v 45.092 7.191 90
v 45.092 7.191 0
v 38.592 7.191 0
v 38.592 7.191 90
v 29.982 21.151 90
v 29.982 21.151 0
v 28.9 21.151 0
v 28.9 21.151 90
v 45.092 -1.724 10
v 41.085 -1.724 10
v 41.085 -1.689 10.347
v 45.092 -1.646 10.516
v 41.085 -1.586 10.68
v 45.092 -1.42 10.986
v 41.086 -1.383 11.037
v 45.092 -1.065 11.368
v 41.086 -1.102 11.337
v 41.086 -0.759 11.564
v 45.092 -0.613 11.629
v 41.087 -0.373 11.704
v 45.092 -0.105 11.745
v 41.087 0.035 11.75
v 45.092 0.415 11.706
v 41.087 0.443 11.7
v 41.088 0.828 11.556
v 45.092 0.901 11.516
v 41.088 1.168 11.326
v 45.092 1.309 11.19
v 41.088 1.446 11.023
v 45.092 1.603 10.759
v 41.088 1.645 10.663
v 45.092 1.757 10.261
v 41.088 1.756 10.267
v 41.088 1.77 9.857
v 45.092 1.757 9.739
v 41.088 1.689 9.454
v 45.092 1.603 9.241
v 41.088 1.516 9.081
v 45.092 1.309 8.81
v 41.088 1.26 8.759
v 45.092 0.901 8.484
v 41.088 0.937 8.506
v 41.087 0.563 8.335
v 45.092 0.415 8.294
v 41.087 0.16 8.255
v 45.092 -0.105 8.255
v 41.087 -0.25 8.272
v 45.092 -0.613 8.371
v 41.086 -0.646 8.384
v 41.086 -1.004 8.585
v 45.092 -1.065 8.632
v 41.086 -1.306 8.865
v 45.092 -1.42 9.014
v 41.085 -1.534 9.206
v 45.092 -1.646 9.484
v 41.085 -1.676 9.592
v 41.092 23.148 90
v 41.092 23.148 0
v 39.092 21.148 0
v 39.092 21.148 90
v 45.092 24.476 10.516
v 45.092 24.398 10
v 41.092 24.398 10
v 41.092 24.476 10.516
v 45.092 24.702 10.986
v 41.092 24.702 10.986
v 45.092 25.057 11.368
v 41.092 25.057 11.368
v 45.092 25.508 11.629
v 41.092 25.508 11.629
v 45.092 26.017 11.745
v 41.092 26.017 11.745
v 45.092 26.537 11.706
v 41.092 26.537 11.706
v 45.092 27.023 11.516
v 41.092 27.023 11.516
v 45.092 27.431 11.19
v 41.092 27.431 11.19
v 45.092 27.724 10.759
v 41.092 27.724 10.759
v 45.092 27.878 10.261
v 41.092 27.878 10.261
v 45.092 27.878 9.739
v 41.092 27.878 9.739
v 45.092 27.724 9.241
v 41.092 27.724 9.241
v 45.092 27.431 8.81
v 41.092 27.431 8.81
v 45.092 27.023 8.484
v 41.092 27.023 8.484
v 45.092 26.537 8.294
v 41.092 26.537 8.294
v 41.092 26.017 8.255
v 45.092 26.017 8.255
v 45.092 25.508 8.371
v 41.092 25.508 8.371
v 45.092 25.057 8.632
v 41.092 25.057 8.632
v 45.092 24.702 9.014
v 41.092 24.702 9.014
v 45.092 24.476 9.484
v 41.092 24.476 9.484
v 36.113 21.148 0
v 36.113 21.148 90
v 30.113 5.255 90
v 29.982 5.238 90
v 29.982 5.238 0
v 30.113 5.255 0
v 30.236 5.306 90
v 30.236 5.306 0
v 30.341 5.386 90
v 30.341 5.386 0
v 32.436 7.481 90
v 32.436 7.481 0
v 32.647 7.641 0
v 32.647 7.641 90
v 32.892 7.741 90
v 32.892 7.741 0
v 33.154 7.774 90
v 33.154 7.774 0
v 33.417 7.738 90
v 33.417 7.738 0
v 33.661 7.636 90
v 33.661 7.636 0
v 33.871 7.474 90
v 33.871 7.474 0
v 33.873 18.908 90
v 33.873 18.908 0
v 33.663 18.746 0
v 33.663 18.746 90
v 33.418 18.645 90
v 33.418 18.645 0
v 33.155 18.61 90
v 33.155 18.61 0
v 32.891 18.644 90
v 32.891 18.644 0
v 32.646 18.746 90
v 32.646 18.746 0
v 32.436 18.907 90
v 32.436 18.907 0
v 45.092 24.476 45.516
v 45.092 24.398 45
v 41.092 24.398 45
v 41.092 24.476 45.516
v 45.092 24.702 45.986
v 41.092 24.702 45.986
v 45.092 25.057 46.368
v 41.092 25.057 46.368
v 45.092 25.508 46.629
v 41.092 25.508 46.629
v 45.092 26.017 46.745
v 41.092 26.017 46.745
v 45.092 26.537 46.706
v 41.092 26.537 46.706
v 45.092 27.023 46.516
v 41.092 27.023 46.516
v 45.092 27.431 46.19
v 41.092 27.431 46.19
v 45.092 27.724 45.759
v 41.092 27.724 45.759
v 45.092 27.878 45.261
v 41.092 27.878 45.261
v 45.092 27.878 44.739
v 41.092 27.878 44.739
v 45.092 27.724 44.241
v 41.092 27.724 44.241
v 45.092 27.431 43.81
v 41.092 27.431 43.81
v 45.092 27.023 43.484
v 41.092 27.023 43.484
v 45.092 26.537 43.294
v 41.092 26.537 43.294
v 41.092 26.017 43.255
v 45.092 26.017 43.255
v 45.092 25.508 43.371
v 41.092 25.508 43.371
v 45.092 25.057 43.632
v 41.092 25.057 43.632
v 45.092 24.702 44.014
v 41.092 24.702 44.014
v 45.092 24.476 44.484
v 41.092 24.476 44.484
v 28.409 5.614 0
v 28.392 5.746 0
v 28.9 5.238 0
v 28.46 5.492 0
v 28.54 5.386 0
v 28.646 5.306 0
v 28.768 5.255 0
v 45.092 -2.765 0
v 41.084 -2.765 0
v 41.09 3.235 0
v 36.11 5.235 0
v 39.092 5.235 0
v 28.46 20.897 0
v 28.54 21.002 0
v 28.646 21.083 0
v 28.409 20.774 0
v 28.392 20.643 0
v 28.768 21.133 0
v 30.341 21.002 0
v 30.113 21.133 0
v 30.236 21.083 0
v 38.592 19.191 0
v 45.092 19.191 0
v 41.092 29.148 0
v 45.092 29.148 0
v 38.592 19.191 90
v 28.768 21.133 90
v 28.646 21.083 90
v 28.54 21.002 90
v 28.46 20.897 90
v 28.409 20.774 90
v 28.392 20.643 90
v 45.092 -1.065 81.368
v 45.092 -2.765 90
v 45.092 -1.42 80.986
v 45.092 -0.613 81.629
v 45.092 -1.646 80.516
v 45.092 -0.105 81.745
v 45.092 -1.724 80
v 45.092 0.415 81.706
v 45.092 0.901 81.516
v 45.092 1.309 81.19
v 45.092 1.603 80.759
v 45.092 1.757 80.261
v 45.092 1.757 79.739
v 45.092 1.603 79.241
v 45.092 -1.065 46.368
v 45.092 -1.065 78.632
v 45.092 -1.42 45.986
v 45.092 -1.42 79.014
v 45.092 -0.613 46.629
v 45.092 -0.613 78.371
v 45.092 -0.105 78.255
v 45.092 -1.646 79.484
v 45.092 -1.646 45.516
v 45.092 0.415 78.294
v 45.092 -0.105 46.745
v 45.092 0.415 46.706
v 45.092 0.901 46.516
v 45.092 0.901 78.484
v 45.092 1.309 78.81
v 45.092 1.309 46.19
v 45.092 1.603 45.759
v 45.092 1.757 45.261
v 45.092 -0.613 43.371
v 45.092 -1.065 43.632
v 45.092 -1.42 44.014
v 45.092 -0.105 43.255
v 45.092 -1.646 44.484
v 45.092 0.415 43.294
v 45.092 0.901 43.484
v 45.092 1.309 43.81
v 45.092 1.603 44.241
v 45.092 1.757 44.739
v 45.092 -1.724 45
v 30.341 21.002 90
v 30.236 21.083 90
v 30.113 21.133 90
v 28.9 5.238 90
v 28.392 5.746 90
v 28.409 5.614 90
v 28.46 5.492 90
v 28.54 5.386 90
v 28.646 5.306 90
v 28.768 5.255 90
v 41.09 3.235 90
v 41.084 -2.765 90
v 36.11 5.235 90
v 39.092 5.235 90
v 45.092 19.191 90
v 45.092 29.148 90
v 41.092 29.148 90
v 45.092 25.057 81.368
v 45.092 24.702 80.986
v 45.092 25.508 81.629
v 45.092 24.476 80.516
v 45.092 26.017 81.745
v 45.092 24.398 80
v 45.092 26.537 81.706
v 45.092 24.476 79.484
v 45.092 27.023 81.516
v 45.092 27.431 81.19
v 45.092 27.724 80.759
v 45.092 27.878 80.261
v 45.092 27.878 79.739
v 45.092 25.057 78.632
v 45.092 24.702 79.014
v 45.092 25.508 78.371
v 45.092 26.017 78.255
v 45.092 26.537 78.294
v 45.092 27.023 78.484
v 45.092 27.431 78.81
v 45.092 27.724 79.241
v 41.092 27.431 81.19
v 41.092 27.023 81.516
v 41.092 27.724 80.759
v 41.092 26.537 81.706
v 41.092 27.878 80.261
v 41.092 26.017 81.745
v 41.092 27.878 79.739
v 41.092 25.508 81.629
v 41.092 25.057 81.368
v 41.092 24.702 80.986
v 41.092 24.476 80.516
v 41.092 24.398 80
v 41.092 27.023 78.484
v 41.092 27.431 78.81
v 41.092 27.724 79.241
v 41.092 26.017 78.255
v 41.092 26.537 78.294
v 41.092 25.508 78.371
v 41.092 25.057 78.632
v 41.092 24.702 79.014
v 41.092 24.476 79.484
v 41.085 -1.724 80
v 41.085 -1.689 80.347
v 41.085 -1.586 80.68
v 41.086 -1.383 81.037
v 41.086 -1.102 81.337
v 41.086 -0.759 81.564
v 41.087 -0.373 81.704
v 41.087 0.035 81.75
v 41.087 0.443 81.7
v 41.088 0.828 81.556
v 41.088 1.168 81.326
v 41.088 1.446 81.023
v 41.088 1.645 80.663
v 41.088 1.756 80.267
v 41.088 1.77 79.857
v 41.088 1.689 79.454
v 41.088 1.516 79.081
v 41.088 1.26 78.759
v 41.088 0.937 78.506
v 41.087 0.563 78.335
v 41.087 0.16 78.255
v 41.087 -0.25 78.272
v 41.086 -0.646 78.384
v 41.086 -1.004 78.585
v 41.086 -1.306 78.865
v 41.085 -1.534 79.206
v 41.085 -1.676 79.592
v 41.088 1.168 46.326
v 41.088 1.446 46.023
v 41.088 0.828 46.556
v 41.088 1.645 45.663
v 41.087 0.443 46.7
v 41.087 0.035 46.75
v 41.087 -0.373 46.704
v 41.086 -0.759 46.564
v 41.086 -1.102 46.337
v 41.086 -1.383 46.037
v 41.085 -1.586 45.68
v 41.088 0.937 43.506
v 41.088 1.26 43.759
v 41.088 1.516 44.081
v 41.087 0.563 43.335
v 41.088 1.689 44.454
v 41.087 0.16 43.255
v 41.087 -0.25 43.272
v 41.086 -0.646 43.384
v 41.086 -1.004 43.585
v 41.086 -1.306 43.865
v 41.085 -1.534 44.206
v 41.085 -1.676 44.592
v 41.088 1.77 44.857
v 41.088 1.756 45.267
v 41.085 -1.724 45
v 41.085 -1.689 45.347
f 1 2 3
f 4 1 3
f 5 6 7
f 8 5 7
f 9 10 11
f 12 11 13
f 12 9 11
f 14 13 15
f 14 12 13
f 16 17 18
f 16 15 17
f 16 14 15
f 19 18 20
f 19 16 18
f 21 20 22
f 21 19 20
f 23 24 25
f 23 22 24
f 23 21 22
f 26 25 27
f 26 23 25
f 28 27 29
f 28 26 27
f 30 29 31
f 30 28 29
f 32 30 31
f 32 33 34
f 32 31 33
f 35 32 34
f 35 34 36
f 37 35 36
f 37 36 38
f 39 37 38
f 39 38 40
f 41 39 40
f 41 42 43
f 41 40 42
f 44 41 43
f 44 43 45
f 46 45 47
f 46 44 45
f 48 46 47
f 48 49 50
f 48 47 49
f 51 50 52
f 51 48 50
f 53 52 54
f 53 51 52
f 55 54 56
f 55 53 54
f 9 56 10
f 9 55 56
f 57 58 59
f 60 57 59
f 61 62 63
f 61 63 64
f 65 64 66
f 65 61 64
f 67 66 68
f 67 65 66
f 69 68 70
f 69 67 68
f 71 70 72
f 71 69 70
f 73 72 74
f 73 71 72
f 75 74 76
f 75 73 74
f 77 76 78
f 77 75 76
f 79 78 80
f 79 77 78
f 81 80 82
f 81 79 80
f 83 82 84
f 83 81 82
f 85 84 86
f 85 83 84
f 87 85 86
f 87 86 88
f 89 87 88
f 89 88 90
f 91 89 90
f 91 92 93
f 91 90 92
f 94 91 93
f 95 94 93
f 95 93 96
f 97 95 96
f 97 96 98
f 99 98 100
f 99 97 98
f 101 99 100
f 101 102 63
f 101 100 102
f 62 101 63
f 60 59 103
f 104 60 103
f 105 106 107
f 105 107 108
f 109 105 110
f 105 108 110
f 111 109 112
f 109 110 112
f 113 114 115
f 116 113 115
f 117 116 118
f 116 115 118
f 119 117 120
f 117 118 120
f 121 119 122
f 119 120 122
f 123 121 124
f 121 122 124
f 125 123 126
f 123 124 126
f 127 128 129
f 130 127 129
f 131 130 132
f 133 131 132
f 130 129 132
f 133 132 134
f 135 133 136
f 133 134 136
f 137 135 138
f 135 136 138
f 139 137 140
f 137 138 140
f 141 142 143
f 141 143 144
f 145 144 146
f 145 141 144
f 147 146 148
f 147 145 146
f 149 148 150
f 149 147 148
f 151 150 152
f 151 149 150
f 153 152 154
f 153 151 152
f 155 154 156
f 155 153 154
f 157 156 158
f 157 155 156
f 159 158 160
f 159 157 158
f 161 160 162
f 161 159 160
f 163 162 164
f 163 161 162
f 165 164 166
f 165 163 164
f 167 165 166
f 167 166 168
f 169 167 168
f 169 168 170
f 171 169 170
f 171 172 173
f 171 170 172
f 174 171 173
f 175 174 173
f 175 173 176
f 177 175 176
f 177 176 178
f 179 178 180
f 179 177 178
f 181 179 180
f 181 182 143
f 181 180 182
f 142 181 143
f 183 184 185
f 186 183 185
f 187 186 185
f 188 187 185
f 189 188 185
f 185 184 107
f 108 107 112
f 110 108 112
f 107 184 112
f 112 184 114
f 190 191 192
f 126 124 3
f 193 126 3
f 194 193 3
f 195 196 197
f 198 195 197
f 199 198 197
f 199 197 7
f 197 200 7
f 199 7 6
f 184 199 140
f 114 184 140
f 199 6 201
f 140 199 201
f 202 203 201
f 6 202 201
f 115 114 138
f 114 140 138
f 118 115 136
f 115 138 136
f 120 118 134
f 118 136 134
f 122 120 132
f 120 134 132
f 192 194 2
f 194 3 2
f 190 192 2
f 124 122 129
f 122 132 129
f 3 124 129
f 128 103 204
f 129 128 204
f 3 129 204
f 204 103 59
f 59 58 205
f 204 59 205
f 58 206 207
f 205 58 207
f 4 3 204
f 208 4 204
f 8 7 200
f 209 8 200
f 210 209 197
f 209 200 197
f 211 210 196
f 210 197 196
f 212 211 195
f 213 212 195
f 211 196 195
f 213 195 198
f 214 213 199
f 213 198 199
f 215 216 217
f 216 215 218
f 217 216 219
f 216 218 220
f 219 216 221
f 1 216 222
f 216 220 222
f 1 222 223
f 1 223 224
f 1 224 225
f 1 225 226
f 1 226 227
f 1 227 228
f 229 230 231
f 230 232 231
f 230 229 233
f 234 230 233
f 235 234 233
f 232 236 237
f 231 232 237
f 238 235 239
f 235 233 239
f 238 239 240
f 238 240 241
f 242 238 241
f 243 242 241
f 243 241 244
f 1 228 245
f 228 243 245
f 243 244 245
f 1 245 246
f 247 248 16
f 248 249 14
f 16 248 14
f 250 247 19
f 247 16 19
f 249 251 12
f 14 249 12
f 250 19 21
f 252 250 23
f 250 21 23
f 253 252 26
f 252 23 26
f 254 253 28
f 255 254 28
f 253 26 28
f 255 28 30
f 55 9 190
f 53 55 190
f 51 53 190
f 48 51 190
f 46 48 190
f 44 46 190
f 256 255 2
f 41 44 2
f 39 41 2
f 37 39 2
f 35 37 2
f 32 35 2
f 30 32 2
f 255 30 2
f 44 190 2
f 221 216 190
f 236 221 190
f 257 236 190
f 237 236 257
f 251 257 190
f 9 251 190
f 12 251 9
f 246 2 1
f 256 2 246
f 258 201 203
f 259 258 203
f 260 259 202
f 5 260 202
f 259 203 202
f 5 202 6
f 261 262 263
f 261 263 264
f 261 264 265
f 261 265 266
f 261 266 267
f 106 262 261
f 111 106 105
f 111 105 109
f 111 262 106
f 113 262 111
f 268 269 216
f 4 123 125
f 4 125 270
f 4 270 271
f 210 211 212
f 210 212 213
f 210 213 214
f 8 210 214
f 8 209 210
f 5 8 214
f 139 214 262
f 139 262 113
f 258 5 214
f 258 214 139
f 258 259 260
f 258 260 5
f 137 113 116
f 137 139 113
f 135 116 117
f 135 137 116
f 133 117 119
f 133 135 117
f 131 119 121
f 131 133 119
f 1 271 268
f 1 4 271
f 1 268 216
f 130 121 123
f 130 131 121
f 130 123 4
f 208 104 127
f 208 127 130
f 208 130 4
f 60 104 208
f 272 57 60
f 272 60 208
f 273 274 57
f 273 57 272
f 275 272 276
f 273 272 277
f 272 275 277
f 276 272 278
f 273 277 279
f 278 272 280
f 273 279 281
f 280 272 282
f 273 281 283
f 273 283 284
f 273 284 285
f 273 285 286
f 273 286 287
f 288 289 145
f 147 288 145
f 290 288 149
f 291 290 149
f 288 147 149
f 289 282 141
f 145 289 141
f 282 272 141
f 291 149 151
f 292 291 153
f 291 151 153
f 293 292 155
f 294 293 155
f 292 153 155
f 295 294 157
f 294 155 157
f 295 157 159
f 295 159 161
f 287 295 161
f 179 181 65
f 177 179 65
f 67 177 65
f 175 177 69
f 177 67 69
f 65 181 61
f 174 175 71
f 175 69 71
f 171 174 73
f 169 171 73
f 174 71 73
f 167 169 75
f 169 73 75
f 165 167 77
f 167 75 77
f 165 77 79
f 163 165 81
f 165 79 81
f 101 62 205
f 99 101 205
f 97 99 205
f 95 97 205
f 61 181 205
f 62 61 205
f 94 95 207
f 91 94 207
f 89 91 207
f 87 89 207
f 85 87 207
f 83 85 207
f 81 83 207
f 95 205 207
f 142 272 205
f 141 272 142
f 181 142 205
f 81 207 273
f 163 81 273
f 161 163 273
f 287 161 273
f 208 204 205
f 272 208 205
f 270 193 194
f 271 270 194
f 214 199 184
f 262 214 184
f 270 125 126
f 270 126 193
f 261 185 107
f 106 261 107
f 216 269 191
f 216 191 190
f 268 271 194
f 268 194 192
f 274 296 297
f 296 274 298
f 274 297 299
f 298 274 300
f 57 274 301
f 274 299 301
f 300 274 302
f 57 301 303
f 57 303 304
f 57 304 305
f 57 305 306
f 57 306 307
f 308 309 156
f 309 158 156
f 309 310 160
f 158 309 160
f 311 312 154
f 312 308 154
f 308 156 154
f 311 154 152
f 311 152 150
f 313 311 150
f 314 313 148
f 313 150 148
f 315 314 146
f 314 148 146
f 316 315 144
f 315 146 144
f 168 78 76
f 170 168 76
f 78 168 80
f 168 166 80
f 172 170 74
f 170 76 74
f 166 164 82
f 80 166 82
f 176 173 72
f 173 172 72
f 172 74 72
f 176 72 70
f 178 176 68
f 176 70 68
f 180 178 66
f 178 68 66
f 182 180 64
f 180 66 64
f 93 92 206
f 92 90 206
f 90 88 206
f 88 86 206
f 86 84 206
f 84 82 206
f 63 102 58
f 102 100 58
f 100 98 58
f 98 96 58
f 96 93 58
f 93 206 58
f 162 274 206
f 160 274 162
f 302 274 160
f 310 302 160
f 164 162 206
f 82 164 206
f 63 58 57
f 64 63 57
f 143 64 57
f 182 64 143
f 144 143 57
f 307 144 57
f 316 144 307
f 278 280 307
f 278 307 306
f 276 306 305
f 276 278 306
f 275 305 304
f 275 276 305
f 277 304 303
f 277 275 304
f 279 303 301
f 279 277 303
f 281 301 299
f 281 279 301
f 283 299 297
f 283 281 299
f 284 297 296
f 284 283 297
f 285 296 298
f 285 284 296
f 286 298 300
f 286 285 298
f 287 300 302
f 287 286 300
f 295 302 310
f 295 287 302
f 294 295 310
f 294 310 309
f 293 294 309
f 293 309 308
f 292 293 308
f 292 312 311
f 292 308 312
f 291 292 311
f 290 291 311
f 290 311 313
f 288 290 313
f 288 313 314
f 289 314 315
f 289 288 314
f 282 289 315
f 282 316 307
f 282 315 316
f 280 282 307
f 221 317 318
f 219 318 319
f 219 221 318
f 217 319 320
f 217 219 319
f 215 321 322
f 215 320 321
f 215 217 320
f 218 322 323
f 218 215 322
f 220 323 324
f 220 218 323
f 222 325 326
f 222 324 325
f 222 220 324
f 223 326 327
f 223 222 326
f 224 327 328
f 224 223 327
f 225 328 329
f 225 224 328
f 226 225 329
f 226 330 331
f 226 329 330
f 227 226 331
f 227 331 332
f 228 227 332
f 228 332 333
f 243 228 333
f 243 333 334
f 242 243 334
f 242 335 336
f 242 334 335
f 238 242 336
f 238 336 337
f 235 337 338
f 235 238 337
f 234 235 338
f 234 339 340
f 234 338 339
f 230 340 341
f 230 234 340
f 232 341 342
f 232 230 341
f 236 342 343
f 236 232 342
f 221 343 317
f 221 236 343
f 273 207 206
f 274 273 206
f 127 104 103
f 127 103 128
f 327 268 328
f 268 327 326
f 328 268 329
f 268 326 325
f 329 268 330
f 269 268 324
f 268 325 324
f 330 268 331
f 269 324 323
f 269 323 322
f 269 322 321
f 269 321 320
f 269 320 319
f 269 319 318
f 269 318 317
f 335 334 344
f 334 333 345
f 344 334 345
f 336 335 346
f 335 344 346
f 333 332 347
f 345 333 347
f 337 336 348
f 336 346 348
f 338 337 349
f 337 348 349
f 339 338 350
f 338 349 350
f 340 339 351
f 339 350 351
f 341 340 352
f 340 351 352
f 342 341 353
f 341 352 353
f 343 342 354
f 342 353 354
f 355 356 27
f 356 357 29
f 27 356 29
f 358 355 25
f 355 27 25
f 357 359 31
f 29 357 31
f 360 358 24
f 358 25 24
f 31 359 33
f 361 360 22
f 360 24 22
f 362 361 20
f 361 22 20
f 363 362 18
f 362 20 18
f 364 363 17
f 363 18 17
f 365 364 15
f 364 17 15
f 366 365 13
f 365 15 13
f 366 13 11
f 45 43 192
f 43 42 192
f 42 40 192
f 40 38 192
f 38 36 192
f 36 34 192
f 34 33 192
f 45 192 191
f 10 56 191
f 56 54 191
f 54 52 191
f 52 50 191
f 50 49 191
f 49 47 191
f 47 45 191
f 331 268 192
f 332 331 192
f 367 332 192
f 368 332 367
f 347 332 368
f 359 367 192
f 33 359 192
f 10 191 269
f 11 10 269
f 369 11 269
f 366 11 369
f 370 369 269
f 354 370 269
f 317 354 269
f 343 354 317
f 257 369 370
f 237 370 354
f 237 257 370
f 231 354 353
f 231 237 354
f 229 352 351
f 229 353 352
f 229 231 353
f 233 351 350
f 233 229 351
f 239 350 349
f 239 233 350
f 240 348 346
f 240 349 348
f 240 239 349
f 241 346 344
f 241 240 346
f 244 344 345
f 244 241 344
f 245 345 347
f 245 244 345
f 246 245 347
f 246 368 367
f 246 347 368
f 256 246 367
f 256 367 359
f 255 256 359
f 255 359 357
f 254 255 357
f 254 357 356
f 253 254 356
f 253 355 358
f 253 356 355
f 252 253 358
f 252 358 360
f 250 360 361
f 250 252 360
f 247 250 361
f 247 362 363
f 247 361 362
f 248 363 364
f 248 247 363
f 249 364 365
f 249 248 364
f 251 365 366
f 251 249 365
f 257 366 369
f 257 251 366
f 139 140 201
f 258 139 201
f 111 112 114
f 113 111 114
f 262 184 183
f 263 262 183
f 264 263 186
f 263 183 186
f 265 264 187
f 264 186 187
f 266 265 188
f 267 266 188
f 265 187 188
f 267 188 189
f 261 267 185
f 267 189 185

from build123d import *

# Parameters (mm, degrees)
BOSS_EXTRUDE1_DEPTH      = 90
CUT_EXTRUDE_3_DEPTH      = 96.450944476
CUT_EXTRUDE_3_DEPTH_BACK = 96.450944476
SKETCH_1_R               = 1.75


with BuildPart() as part:
    # Sketch3 → Boss-Extrude1 (new body)
    with BuildSketch(Plane.XY):
        with BuildLine():
            ThreePointArc((28.391540767, 5.745528826), (28.540330522, 5.386318581), (28.899540767, 5.237528826))
            Line((28.899540767, 5.237528826), (29.981834767, 5.237528826))
            ThreePointArc((29.981834767, 5.237528826), (30.17623795, 5.276198023), (30.341045012, 5.386318581))
            Line((30.341045012, 5.386318581), (32.435619517, 7.480893087))
            ThreePointArc((32.435619517, 7.480893087), (33.154438301, 7.774195584), (33.870518646, 7.474269363))
            Line((33.870518646, 7.474269363), (36.110112773, 5.234675237))
            Line((36.110112773, 5.234675237), (39.091540767, 5.234675237))
            Line((39.091540767, 5.234675237), (41.08974786, 3.234676041))
            Line((41.08974786, 3.234676041), (41.084369139, -2.765323955))
            Line((41.084369139, -2.765323955), (45.091540767, -2.765323955))
            Line((45.091540767, -2.765323955), (45.091540767, 7.191225138))
            Line((45.091540767, 7.191225138), (41.088844083, 7.191225138))
            Line((41.088844083, 7.191225138), (38.591540767, 7.191225138))
            Line((38.591540767, 7.191225138), (38.591540767, 19.191225138))
            Line((38.591540767, 19.191225138), (41.091540767, 19.191225138))
            Line((41.091540767, 19.191225138), (45.091540767, 19.191225138))
            Line((45.091540767, 19.191225138), (45.091540767, 29.147775237))
            Line((45.091540767, 29.147775237), (41.091540767, 29.147775237))
            Line((41.091540767, 29.147775237), (41.091540767, 23.147775237))
            Line((41.091540767, 23.147775237), (39.091540767, 21.147775237))
            Line((39.091540767, 21.147775237), (36.112970002, 21.147775237))
            Line((36.112970002, 21.147775237), (33.873375875, 18.908181111))
            ThreePointArc((33.873375875, 18.908181111), (33.154687691, 18.609685261), (32.435619517, 18.907264564))
            Line((32.435619517, 18.907264564), (30.341045012, 21.00183907))
            ThreePointArc((30.341045012, 21.00183907), (30.17623795, 21.111959628), (29.981834767, 21.150628826))
            Line((29.981834767, 21.150628826), (28.899540767, 21.150628826))
            ThreePointArc((28.899540767, 21.150628826), (28.540330522, 21.00183907), (28.391540767, 20.642628826))
            Line((28.391540767, 20.642628826), (28.391540767, 5.745528826))
        make_face()
    extrude(amount=BOSS_EXTRUDE1_DEPTH)

    # Эскиз1 → Вырез-Вытянуть3 (cut, two sides: drawn at the far end of the back side and taken through both)
    with BuildSketch(Plane.ZY.offset(-41.091540767).offset(-CUT_EXTRUDE_3_DEPTH_BACK)):
        with Locations(Location((10, 0.026075116, 0), (0, 0, 270))):
            Circle(SKETCH_1_R)
        with Locations(Location((45, 0.026075116, 0), (0, 0, 270))):
            Circle(SKETCH_1_R)
        with Locations(Location((80, 0.026075116, 0), (0, 0, 270))):
            Circle(SKETCH_1_R)
        with Locations(Location((45, 26.147775237, 0), (0, 0, 270))):
            Circle(SKETCH_1_R)
        with Locations(Location((80, 26.147775237, 0), (0, 0, 270))):
            Circle(SKETCH_1_R)
        with Locations(Location((10, 26.147775237, 0), (0, 0, 270))):
            Circle(SKETCH_1_R)
    extrude(amount=CUT_EXTRUDE_3_DEPTH + CUT_EXTRUDE_3_DEPTH_BACK, mode=Mode.SUBTRACT)


solid = part.part
